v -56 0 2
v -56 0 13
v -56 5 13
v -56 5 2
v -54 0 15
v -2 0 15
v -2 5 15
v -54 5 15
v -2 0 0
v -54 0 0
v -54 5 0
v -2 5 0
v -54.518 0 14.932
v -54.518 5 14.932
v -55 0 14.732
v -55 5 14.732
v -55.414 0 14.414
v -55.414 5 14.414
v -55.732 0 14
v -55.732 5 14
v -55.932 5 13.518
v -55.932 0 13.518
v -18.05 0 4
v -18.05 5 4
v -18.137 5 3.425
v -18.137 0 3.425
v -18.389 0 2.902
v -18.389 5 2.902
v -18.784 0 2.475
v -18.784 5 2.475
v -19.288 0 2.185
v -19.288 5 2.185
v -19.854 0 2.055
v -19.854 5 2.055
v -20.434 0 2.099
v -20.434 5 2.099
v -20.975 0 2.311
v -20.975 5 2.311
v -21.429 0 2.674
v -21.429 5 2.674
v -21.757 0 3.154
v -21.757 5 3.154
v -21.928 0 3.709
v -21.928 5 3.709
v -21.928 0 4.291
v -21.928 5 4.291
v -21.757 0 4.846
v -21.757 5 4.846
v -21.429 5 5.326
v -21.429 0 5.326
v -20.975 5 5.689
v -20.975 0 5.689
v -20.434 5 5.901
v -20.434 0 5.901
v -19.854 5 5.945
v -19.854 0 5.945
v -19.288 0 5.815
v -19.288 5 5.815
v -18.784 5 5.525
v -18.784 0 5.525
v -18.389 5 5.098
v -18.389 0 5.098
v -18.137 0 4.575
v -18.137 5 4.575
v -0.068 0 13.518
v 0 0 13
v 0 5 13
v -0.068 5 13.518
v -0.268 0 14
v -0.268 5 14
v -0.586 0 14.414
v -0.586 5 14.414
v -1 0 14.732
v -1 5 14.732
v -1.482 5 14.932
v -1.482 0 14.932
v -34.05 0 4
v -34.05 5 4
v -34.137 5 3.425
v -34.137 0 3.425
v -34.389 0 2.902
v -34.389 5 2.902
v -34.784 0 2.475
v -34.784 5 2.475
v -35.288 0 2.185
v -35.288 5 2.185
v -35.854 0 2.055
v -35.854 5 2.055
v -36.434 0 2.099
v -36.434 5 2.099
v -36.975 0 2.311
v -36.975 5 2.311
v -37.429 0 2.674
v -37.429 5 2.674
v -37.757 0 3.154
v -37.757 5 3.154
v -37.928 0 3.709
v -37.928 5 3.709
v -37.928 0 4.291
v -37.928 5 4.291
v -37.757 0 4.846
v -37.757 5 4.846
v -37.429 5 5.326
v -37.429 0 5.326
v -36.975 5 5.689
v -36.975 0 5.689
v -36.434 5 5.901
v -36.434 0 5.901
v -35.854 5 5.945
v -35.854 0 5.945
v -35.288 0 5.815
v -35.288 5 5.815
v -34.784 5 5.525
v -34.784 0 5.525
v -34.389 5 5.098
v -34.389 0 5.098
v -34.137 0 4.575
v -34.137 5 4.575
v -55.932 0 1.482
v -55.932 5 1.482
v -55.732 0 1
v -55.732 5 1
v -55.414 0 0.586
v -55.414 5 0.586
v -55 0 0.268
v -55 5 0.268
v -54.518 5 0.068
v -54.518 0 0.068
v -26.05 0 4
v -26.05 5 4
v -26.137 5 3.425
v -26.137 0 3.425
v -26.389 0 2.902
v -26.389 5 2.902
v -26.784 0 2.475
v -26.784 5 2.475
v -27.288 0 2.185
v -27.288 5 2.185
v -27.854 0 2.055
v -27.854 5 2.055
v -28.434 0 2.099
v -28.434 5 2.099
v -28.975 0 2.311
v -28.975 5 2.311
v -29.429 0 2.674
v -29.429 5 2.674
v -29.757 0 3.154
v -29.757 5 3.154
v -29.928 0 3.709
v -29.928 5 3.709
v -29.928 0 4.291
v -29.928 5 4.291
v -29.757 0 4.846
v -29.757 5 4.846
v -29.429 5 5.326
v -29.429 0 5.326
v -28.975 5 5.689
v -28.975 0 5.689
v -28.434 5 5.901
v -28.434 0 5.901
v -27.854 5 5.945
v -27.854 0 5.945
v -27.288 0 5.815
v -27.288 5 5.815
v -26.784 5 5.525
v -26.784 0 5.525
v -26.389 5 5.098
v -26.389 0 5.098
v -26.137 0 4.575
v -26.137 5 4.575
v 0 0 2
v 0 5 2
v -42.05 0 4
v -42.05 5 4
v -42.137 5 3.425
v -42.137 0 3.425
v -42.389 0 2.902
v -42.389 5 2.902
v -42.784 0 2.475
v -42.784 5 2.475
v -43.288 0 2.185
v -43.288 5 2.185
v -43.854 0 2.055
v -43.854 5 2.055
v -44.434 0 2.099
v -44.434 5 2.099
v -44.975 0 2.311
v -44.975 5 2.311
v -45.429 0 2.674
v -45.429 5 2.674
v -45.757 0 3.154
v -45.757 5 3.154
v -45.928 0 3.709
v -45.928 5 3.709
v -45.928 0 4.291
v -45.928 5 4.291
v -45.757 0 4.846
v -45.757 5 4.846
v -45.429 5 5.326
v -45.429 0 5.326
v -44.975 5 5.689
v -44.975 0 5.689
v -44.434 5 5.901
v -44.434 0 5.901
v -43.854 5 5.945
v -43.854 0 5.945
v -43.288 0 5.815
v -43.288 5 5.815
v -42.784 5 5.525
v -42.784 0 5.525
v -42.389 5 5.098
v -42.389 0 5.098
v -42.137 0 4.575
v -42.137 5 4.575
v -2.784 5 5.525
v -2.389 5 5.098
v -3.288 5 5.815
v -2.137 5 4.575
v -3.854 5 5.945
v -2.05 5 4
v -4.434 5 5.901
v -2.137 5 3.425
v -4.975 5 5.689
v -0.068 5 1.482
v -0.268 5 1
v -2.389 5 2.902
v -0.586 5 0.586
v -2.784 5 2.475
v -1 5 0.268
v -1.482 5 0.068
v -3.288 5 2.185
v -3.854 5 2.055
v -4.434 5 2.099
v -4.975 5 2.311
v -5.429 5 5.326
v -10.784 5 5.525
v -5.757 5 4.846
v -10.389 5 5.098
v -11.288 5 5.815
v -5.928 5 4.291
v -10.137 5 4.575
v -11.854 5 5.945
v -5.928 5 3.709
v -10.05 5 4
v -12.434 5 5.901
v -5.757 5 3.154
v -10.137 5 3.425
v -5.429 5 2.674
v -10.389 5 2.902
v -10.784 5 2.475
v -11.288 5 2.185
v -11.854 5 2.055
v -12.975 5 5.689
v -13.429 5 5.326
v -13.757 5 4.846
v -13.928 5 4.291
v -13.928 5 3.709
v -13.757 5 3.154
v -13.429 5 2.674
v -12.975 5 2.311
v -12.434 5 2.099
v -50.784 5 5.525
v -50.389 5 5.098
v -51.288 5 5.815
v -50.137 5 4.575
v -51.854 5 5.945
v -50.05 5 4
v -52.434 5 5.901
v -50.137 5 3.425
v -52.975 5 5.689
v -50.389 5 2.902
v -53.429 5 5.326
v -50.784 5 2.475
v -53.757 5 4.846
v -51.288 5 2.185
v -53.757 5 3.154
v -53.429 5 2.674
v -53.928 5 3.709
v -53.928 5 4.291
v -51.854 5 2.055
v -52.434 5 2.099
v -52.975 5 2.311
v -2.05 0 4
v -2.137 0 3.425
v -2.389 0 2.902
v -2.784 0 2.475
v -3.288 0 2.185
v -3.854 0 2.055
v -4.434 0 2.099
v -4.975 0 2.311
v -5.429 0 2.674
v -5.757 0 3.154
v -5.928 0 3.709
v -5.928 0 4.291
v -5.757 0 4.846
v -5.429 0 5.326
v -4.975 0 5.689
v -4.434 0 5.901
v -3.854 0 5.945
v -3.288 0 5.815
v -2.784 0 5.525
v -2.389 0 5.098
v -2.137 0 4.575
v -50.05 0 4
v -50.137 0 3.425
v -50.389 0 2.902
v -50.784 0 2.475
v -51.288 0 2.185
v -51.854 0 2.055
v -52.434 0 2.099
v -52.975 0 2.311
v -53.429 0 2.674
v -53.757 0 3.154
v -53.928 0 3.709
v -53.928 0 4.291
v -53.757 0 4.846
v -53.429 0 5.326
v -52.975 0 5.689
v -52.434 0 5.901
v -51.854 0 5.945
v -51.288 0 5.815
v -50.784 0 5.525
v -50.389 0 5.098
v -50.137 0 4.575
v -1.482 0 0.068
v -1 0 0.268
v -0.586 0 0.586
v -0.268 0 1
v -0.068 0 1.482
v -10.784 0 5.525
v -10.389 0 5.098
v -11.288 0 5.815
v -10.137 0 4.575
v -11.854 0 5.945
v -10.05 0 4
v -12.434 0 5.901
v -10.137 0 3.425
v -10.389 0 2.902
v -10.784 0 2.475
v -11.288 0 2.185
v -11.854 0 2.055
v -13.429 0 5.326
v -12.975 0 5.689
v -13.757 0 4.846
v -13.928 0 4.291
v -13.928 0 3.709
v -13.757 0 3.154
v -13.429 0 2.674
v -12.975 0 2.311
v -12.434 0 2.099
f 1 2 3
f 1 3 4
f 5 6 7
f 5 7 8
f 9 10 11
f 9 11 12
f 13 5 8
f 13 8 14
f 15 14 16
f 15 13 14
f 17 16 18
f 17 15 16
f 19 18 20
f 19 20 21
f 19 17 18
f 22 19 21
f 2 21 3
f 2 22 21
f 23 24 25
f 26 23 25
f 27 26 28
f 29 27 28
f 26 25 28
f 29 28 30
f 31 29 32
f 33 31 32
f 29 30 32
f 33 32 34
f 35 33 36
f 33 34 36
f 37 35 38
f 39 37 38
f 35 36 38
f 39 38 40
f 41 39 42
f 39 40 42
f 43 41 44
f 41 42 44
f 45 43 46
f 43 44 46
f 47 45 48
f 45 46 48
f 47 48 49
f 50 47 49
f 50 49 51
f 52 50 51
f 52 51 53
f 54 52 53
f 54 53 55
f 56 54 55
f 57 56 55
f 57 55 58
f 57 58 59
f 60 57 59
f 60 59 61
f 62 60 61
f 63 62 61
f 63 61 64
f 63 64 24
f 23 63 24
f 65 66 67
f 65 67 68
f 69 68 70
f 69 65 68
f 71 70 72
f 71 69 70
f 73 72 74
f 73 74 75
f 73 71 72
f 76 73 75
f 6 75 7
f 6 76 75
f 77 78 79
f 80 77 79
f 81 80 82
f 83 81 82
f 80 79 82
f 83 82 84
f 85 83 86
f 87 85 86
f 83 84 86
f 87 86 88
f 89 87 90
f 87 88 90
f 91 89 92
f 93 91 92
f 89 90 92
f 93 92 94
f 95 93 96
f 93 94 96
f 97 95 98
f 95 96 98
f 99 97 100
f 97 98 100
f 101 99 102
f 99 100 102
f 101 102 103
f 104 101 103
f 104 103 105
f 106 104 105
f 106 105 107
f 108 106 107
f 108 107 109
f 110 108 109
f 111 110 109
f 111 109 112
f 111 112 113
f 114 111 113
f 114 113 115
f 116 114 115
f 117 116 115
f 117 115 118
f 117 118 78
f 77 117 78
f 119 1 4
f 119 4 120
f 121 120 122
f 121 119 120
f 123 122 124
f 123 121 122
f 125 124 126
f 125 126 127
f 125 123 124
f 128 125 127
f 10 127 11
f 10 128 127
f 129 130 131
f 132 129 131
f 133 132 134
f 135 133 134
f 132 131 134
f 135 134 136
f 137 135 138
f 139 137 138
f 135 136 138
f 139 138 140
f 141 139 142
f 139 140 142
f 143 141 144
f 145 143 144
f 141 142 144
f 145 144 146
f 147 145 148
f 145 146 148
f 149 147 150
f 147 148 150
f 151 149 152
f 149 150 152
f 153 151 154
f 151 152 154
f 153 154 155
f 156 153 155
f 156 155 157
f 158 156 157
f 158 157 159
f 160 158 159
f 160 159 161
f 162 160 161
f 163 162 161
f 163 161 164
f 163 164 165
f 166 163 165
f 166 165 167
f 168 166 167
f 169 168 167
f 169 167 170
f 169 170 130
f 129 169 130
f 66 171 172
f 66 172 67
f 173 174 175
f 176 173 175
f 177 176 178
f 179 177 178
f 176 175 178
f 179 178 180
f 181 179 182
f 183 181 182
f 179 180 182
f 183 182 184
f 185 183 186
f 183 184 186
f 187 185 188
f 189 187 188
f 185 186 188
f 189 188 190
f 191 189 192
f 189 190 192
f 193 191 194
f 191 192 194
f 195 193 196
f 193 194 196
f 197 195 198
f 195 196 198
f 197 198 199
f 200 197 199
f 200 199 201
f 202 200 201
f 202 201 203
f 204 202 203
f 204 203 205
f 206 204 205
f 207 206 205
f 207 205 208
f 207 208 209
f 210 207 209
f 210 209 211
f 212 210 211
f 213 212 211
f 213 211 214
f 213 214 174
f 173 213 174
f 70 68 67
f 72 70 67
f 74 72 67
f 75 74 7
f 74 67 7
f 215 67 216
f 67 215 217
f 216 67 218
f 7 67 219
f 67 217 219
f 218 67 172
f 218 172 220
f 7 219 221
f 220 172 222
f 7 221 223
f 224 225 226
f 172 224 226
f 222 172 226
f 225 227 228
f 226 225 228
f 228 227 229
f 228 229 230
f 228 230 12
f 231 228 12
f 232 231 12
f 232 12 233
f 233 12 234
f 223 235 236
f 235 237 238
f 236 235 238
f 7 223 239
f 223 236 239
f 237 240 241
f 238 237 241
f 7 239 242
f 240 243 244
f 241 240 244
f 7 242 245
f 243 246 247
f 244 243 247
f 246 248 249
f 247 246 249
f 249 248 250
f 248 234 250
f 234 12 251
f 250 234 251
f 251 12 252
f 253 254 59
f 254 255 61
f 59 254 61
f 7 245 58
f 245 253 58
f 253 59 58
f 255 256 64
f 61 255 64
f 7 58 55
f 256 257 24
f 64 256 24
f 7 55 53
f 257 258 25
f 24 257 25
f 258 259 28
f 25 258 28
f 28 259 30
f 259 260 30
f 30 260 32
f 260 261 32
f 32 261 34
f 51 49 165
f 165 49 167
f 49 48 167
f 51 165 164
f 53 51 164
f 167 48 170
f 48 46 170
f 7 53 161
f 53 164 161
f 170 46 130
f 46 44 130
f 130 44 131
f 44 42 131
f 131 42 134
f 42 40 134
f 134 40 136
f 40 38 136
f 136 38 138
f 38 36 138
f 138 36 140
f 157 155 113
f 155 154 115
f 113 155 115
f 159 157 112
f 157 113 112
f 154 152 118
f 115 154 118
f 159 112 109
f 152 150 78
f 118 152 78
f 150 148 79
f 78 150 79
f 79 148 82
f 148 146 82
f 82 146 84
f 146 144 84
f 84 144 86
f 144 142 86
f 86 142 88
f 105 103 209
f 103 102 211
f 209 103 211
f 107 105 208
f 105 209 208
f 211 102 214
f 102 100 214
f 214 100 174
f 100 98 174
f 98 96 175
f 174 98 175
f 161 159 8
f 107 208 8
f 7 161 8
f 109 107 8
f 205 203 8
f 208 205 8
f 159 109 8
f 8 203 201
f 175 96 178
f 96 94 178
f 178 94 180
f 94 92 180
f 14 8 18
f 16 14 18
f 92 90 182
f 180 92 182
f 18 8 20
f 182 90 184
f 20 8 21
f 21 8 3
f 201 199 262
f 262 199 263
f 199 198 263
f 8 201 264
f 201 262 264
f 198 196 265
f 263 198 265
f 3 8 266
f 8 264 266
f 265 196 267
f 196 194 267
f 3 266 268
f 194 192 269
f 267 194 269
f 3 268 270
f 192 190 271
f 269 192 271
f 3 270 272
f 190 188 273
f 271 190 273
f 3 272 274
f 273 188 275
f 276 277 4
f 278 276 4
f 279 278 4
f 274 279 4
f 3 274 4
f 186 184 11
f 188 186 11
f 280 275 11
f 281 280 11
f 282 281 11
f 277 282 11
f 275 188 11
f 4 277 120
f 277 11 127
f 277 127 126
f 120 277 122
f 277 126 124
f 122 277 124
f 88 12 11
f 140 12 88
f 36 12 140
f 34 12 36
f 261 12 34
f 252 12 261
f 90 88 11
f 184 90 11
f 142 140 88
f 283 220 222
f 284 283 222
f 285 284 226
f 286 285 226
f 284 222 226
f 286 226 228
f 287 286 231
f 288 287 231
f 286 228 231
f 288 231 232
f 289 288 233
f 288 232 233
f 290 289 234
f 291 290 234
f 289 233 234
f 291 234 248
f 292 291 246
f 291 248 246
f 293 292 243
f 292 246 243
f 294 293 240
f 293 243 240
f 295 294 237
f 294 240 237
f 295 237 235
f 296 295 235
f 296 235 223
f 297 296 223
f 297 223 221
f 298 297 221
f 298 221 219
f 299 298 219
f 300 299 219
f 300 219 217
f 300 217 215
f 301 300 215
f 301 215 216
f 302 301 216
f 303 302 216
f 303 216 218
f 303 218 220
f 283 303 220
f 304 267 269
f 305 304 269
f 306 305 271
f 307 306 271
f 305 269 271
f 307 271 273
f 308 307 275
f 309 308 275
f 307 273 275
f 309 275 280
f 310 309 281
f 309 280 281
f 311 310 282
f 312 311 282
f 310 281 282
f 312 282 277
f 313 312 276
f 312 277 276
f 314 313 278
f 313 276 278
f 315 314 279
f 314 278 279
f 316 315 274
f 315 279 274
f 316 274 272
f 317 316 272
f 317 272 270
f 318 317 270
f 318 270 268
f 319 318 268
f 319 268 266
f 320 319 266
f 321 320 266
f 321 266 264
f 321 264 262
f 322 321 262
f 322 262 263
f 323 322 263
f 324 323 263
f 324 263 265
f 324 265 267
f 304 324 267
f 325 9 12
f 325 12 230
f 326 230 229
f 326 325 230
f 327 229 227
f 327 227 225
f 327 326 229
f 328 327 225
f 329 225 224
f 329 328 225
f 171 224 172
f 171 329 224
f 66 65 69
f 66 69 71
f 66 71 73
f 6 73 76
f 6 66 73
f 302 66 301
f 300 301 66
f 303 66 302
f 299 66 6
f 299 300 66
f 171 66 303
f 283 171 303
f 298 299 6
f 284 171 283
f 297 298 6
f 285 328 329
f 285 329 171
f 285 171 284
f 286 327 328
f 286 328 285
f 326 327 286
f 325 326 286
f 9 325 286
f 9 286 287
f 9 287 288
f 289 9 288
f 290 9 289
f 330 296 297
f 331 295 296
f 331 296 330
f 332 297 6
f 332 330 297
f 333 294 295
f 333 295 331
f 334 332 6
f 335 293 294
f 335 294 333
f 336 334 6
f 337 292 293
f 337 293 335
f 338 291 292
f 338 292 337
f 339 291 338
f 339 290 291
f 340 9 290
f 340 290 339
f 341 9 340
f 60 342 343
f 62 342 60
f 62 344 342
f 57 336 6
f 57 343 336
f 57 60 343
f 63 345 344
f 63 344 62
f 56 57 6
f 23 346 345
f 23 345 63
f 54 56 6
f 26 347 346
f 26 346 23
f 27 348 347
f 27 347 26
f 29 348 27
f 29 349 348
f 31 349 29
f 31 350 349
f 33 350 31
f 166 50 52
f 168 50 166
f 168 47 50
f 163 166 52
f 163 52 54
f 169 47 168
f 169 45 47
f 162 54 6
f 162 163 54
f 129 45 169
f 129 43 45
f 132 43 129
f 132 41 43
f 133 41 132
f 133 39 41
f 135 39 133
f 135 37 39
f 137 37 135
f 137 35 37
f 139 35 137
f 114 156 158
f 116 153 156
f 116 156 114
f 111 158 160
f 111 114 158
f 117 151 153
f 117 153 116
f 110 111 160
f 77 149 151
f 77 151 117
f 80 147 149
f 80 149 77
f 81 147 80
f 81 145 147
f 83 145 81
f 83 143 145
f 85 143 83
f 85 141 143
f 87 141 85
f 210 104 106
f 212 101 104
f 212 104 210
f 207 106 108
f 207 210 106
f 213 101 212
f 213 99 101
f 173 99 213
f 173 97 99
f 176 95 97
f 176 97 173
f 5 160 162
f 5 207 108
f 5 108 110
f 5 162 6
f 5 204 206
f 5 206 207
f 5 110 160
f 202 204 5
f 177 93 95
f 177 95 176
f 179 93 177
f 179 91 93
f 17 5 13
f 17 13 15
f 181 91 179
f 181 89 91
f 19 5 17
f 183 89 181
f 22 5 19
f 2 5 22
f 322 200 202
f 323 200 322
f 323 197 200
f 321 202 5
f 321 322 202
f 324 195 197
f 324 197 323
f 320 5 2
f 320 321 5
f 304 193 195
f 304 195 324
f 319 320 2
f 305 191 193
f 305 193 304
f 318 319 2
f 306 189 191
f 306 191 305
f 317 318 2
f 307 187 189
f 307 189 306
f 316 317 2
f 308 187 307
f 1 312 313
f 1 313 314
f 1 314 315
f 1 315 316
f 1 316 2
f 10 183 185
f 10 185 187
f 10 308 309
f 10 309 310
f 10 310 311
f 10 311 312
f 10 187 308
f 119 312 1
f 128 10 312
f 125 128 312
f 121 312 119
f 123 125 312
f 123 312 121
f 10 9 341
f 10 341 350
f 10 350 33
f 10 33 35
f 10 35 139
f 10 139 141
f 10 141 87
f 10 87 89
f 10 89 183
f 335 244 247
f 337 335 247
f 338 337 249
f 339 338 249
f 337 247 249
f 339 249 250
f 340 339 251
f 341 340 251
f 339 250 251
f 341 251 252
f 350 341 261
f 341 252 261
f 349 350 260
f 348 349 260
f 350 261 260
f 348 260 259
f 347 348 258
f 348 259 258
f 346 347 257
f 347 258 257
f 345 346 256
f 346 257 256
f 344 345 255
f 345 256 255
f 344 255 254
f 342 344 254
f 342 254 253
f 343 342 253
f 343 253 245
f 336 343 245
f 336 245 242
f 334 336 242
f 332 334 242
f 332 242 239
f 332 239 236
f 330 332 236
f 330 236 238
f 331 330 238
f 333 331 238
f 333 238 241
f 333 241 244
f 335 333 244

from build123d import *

# Parameters (mm, degrees)
BOSS_EXTRUDE1_DEPTH = 5
SKETCH2_R           = 1.95
CUT_EXTRUDE1_DEPTH  = 6


with BuildPart() as part:
    # Sketch1 → Boss-Extrude1 (new body)
    with BuildSketch(Plane(origin=(0, 0, 0), x_dir=(1, 0, 0), z_dir=(0, 1, 0))):
        with BuildLine():
            Line((-54, 0), (-2, 0))
            ThreePointArc((-2, 0), (-0.585786438, -0.585786438), (0, -2))
            Line((0, -2), (0, -13))
            ThreePointArc((0, -13), (-0.585786438, -14.414213562), (-2, -15))
            Line((-2, -15), (-54, -15))
            ThreePointArc((-54, -15), (-55.414213562, -14.414213562), (-56, -13))
            Line((-56, -13), (-56, -2))
            ThreePointArc((-56, -2), (-55.414213562, -0.585786438), (-54, 0))
        make_face()
    extrude(amount=BOSS_EXTRUDE1_DEPTH)

    # Sketch2 → Cut-Extrude1 (cut, through all)
    with BuildSketch(Plane(origin=(0, 5, 0), x_dir=(1, 0, 0), z_dir=(0, 1, 0))):
        with Locations((-4, -4)):
            Circle(SKETCH2_R)
        with Locations((-12, -4)):
            Circle(SKETCH2_R)
        with Locations((-76, -4)):
            Circle(SKETCH2_R)
        with Locations((-68, -4)):
            Circle(SKETCH2_R)
        with Locations((-60, -4)):
            Circle(SKETCH2_R)
        with Locations((-52, -4)):
            Circle(SKETCH2_R)
        with Locations((-44, -4)):
            Circle(SKETCH2_R)
        with Locations((-36, -4)):
            Circle(SKETCH2_R)
        with Locations((-28, -4)):
            Circle(SKETCH2_R)
        with Locations((-20, -4)):
            Circle(SKETCH2_R)
    extrude(amount=-CUT_EXTRUDE1_DEPTH, mode=Mode.SUBTRACT)


solid = part.part
